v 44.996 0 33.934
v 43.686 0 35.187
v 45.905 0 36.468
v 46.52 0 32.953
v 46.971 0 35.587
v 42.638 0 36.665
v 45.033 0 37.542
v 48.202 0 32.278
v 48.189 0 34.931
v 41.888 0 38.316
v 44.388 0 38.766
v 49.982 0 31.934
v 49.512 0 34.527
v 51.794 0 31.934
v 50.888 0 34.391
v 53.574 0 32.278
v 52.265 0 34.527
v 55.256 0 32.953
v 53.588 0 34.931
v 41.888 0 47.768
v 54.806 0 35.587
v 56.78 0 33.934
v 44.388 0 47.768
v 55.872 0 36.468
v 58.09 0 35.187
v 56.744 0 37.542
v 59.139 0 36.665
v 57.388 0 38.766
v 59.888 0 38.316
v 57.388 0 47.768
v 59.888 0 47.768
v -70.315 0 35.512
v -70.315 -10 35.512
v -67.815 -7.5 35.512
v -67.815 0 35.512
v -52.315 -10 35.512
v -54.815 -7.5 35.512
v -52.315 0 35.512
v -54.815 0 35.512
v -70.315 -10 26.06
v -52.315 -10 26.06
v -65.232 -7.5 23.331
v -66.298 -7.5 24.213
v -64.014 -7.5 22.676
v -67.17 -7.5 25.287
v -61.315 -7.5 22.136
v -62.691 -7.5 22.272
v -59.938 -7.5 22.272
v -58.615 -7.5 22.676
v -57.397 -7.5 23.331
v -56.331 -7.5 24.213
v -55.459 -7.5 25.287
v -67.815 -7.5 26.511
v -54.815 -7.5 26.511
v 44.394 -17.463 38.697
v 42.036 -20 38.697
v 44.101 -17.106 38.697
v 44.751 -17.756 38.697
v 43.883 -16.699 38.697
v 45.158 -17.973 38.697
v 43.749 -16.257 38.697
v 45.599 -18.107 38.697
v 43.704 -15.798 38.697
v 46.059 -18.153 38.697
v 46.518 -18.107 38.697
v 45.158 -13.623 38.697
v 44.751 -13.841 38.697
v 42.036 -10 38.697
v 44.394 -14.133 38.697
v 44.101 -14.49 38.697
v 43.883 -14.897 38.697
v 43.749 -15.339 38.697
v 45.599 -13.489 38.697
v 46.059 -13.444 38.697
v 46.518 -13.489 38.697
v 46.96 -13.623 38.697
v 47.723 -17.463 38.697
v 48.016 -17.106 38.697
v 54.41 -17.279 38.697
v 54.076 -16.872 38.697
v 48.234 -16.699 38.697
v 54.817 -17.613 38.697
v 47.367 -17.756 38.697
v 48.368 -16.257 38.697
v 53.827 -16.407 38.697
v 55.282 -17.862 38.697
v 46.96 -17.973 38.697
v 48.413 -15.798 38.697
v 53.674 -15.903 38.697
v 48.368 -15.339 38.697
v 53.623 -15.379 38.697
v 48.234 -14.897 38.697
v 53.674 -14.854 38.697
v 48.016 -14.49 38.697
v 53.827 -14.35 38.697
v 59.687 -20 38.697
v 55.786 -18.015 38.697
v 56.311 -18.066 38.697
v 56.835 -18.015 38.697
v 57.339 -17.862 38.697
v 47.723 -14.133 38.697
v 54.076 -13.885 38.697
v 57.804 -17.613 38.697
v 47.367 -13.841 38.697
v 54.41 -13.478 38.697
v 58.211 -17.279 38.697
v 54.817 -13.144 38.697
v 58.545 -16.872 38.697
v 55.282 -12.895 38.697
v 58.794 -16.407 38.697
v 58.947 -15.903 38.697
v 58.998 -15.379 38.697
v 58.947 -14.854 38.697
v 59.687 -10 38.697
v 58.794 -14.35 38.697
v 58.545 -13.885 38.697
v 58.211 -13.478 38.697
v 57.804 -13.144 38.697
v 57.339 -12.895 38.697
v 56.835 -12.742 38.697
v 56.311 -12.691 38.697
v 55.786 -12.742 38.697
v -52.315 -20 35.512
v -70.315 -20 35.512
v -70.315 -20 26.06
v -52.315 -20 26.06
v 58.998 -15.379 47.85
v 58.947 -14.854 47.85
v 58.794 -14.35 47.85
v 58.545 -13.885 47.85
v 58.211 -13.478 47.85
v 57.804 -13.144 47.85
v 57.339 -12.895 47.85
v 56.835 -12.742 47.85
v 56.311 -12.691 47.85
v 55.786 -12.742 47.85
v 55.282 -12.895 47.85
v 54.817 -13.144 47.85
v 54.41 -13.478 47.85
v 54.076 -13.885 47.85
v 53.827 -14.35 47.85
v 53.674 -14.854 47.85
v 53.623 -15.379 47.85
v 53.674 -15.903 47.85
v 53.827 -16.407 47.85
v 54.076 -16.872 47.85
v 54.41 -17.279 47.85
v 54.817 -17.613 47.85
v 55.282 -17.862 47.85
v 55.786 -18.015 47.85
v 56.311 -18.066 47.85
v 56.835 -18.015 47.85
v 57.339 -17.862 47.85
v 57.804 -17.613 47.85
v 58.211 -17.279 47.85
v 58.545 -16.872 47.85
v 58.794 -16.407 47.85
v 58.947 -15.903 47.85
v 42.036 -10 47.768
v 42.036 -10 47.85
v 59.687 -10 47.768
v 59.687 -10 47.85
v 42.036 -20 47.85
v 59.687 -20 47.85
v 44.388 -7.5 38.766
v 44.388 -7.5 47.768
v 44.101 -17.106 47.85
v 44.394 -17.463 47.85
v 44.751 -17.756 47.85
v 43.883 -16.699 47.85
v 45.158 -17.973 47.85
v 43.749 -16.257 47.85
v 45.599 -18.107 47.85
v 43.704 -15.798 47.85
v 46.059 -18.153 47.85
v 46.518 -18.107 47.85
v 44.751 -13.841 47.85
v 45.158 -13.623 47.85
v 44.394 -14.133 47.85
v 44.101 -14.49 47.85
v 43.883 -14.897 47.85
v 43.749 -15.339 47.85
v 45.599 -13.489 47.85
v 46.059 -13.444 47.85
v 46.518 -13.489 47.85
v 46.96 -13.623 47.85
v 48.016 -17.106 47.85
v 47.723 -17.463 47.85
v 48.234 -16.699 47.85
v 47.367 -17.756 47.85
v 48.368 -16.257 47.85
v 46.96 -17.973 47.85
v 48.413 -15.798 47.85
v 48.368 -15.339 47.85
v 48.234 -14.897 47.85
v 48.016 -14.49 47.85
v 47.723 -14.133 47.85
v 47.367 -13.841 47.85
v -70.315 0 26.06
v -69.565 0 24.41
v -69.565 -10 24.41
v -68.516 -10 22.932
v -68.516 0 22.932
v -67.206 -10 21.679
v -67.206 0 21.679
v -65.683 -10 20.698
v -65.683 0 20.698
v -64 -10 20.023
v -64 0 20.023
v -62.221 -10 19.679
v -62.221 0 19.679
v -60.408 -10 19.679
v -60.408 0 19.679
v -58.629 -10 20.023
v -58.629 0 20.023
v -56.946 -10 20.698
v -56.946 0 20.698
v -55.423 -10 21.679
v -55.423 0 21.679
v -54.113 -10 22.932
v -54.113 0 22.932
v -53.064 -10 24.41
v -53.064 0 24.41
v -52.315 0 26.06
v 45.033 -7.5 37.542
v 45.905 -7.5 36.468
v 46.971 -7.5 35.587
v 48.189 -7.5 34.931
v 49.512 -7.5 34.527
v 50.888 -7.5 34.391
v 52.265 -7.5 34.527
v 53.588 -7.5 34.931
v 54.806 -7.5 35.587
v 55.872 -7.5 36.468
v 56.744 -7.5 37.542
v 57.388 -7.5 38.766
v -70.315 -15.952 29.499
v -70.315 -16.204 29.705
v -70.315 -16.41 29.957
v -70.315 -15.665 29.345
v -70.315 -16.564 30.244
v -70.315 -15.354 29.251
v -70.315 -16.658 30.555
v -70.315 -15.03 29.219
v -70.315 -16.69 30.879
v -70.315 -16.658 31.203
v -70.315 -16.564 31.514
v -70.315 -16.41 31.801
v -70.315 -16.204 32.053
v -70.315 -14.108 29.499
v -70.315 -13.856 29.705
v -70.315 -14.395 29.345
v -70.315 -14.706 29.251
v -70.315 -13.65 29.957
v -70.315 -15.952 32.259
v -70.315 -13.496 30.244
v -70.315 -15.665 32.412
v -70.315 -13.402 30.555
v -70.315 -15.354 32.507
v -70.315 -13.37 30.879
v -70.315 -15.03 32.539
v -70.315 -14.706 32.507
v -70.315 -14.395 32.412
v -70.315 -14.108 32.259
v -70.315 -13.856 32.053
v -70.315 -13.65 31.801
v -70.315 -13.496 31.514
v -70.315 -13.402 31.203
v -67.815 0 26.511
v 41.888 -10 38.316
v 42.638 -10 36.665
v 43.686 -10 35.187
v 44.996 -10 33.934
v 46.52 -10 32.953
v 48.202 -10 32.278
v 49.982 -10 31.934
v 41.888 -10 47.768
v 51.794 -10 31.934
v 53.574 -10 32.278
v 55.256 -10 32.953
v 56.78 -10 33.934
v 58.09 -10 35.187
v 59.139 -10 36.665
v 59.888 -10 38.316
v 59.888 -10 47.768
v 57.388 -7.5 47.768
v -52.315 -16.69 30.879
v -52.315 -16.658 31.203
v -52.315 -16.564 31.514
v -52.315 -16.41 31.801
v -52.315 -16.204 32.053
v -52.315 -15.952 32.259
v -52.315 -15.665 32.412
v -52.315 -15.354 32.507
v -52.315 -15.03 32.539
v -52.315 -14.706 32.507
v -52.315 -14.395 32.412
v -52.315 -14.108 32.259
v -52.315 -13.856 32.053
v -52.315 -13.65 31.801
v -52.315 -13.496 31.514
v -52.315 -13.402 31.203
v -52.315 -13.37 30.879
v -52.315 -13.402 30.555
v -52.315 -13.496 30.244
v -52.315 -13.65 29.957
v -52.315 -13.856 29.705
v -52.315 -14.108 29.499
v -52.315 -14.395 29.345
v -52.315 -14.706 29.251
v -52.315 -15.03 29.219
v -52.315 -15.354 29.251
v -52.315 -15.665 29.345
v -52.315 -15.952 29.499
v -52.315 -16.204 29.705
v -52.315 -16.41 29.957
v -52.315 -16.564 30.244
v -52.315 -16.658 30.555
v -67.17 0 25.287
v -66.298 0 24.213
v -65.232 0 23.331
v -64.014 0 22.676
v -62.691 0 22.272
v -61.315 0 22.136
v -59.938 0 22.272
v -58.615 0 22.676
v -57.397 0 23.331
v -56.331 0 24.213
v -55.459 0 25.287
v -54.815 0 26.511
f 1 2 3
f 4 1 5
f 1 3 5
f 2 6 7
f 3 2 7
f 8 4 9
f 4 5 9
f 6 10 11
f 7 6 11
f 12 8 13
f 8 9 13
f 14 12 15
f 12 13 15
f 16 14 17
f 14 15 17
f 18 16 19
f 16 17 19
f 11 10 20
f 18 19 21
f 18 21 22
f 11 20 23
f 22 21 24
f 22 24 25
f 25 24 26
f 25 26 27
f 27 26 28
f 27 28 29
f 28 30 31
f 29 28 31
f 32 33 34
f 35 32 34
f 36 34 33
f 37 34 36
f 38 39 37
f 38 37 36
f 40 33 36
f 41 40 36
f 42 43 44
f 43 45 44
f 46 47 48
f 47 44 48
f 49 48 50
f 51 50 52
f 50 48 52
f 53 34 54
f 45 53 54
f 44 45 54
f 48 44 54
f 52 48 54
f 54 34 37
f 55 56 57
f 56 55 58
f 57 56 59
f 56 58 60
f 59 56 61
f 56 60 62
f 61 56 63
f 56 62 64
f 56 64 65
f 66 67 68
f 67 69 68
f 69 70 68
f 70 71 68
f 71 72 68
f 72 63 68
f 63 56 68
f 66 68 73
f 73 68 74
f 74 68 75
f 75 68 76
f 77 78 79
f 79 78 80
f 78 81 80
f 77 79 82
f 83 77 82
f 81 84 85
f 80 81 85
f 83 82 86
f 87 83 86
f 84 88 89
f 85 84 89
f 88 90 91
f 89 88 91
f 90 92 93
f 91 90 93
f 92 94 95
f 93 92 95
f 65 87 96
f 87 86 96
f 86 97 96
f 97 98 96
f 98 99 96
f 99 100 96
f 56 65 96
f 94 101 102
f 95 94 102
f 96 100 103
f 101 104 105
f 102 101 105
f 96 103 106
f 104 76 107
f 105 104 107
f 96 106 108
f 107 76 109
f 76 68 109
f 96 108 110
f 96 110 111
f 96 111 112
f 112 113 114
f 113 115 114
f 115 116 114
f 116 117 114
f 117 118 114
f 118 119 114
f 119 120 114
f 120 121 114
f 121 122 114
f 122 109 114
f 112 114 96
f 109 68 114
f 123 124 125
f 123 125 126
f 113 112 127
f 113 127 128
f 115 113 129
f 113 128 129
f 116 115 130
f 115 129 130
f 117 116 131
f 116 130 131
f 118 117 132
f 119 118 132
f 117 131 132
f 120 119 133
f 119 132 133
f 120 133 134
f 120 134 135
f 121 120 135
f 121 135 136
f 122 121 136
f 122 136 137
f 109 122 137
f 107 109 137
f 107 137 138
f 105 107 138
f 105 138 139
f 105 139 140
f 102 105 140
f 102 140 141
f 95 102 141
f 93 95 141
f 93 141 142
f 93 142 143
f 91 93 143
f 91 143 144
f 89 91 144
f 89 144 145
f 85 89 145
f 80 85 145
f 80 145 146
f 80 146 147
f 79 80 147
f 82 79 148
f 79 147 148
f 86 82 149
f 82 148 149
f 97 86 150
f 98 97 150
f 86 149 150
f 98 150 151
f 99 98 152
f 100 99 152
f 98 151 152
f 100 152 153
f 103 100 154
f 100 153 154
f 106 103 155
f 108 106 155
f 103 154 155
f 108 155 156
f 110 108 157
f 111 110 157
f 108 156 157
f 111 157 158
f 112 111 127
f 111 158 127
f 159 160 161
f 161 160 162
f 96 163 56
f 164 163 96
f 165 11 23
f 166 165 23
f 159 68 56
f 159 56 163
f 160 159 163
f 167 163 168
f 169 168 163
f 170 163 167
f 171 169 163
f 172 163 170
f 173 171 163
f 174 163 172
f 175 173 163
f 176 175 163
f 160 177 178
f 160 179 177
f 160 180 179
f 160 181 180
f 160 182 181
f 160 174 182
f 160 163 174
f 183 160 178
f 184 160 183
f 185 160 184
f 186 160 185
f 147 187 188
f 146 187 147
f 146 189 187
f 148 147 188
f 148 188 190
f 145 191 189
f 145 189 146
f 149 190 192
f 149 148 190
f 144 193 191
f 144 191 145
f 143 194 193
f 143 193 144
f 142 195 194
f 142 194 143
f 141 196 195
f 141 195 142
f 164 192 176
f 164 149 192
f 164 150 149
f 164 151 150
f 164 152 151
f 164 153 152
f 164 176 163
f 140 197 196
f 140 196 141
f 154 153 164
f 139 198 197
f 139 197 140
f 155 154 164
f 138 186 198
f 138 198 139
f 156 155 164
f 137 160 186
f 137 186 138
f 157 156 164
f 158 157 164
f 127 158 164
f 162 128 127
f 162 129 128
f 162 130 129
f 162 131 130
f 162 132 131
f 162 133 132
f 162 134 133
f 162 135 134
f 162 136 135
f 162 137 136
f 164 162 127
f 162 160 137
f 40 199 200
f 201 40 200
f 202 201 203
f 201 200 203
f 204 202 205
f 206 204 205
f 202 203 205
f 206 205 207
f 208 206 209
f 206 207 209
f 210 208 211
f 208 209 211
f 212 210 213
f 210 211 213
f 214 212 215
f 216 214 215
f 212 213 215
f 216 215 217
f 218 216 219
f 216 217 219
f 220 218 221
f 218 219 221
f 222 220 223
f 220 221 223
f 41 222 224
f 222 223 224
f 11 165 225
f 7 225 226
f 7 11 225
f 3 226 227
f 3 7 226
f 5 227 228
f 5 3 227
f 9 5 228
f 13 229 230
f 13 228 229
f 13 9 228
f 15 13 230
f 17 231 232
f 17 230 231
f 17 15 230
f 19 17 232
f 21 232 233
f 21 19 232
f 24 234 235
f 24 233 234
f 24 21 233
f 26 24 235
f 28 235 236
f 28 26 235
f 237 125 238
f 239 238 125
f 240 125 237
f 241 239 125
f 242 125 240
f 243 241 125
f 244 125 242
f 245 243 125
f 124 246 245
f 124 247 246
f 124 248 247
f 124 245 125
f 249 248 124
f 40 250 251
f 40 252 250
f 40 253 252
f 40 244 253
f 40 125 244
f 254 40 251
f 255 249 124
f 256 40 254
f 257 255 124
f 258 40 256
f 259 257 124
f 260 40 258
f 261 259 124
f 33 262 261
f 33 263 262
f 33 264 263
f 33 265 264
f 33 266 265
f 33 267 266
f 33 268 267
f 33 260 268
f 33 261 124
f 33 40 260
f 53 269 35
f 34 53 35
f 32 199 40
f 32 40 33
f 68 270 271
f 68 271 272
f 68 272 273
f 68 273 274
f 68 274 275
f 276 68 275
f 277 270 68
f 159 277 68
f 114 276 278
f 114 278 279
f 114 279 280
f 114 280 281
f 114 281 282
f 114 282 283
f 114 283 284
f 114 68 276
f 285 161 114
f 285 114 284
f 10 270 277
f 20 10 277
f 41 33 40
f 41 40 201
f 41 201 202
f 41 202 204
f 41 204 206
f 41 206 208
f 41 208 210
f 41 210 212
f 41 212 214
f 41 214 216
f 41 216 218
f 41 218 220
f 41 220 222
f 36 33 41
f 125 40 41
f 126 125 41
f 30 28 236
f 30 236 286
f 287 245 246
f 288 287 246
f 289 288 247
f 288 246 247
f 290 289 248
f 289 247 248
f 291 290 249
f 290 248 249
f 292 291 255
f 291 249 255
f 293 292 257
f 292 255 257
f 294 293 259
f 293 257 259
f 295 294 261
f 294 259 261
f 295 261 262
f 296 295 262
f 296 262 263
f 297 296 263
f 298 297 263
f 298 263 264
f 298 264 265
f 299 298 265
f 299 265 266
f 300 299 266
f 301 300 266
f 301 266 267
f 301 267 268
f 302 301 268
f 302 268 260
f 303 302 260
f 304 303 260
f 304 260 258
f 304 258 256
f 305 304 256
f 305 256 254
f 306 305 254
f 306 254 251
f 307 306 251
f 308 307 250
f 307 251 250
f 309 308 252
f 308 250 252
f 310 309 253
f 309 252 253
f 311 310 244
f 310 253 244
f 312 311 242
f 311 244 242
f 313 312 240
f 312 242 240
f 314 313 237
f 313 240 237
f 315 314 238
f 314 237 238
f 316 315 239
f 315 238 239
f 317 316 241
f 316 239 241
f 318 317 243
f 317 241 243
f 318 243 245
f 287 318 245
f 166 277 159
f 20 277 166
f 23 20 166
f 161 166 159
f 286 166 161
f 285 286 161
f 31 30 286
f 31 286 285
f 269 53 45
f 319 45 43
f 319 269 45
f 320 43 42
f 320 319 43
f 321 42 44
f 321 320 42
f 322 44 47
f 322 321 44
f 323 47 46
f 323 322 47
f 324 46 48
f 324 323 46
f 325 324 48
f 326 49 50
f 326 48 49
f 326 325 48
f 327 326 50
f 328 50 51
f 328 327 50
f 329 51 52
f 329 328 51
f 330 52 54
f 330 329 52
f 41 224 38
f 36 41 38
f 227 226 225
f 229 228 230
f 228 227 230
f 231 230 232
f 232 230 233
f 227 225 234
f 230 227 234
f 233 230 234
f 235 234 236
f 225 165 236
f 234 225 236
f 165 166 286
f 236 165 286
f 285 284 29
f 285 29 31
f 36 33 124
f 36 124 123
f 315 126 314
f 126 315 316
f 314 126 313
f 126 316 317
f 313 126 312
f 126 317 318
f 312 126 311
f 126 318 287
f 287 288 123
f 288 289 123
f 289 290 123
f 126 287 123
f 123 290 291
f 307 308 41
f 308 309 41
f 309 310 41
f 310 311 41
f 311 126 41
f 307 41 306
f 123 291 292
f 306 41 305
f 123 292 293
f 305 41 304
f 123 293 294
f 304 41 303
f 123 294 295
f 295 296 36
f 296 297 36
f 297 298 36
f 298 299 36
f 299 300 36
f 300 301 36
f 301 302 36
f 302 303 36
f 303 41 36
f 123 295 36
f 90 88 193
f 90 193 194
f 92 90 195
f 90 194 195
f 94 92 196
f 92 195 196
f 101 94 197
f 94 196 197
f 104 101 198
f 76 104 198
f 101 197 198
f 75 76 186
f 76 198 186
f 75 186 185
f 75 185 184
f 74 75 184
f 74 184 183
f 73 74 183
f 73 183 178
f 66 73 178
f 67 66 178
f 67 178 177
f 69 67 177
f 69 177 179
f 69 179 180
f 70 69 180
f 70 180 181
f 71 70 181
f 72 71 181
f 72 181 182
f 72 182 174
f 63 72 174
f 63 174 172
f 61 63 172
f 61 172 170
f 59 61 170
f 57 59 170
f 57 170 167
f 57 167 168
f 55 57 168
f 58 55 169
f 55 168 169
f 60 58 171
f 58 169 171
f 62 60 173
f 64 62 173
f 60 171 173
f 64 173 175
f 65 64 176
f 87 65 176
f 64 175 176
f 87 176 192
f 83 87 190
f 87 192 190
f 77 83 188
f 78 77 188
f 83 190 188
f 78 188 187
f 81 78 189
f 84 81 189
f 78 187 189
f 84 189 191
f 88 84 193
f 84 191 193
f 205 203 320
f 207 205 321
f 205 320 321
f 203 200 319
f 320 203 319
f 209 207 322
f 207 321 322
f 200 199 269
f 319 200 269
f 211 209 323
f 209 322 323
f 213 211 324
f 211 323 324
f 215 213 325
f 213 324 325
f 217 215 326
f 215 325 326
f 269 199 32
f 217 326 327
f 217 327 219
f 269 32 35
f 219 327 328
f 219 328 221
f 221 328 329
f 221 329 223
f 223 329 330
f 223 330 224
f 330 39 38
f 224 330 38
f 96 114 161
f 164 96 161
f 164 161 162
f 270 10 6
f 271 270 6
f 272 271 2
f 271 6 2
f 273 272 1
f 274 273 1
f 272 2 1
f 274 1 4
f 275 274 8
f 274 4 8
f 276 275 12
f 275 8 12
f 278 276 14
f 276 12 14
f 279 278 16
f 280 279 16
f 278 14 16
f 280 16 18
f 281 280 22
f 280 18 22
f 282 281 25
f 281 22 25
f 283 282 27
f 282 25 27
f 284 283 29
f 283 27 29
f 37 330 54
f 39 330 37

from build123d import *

# Parameters (mm, degrees)
F0_W     = 18
F0_H     = 9.451737664
F1_DEPTH = 10
F2_T     = -2.5
F2_2_T   = -2.5
F3_W     = 18
F3_H     = 9.451737664
F4_DEPTH = 10
F3_W_2   = 17.6508575678
F3_H_2   = 9.1523528099
F5_R     = 2.6878293193
F5_R_2   = 2.3544087044
F6_DEPTH = 25
F7_R     = 1.66
F8_DEPTH = 25


with BuildPart() as f1:
    # F0 (on Front) → F1 (new body)
    with BuildSketch(Plane.XZ):
        with Locations((-61.3145157695, 30.7863325212)):
            Rectangle(F0_W, F0_H)
        with BuildLine():
            Line((-52.3145157695, 26.0604636891), (-70.3145157695, 26.0604636891))
            ThreePointArc((-70.3145157695, 26.0604636891), (-61.3145157695, 19.6358036407), (-52.3145157695, 26.0604636891))
        make_face()
    extrude(amount=F1_DEPTH)

    # F2
    f2_openings = [f1.faces().sort_by_distance(p)[0] for p in [
        (-61.314516, -5, 35.512201),
        (-61.314516, 0, 28.335197),
    ]]
    offset(amount=F2_T, openings=f2_openings)


with BuildPart() as f1b:
    # F0 (on Front) → F1, piece 2 (new body)
    with BuildSketch(Plane.XZ):
        with Locations((50.8881695569, 43.0416602246)):
            Rectangle(F0_W, F0_H)
        with BuildLine():
            Line((59.8881695569, 38.3157913926), (41.8881695569, 38.3157913926))
            ThreePointArc((41.8881695569, 38.3157913926), (50.8881695569, 31.8911313442), (59.8881695569, 38.3157913926))
        make_face()
    extrude(amount=F1_DEPTH)

    # F2#2
    f2_2_openings = [f1b.faces().sort_by_distance(p)[0] for p in [
        (50.88817, 0, 40.590525),
        (50.88817, -5, 47.767529),
    ]]
    offset(amount=F2_2_T, openings=f2_2_openings)

    # F3 (on face) → F4, piece 2 (join)
    with BuildSketch(Plane.XZ.offset(10)):
        with Locations((50.8615411818, 43.2734750211)):
            Rectangle(F3_W_2, F3_H_2)
    extrude(amount=F4_DEPTH)

    # F5 (on face) → F6 (cut)
    with BuildSketch(Plane.XY.offset(47.8496514261)):
        with Locations((56.3105680048, -15.3786037117)):
            Circle(F5_R)
        with Locations((46.058550477, -15.7981198281)):
            Circle(F5_R_2)
    extrude(amount=-F6_DEPTH, mode=Mode.SUBTRACT)


with BuildPart() as f4:
    # F3 (on face) → F4 (new body)
    with BuildSketch(Plane.XZ.offset(10)):
        with Locations((-61.3145157695, 30.7863325212)):
            Rectangle(F3_W, F3_H)
    extrude(amount=F4_DEPTH)

    # F7 (on face) → F8 (cut)
    with BuildSketch(Plane(origin=(-70.3145157695, 0, 0), x_dir=(0, -1, 0), z_dir=(-1, 0, 0))):
        with Locations((15.0299780071, 30.8788195252)):
            Circle(F7_R)
    extrude(amount=-F8_DEPTH, mode=Mode.SUBTRACT)


solid = Compound([f1.part, f1b.part, f4.part])
